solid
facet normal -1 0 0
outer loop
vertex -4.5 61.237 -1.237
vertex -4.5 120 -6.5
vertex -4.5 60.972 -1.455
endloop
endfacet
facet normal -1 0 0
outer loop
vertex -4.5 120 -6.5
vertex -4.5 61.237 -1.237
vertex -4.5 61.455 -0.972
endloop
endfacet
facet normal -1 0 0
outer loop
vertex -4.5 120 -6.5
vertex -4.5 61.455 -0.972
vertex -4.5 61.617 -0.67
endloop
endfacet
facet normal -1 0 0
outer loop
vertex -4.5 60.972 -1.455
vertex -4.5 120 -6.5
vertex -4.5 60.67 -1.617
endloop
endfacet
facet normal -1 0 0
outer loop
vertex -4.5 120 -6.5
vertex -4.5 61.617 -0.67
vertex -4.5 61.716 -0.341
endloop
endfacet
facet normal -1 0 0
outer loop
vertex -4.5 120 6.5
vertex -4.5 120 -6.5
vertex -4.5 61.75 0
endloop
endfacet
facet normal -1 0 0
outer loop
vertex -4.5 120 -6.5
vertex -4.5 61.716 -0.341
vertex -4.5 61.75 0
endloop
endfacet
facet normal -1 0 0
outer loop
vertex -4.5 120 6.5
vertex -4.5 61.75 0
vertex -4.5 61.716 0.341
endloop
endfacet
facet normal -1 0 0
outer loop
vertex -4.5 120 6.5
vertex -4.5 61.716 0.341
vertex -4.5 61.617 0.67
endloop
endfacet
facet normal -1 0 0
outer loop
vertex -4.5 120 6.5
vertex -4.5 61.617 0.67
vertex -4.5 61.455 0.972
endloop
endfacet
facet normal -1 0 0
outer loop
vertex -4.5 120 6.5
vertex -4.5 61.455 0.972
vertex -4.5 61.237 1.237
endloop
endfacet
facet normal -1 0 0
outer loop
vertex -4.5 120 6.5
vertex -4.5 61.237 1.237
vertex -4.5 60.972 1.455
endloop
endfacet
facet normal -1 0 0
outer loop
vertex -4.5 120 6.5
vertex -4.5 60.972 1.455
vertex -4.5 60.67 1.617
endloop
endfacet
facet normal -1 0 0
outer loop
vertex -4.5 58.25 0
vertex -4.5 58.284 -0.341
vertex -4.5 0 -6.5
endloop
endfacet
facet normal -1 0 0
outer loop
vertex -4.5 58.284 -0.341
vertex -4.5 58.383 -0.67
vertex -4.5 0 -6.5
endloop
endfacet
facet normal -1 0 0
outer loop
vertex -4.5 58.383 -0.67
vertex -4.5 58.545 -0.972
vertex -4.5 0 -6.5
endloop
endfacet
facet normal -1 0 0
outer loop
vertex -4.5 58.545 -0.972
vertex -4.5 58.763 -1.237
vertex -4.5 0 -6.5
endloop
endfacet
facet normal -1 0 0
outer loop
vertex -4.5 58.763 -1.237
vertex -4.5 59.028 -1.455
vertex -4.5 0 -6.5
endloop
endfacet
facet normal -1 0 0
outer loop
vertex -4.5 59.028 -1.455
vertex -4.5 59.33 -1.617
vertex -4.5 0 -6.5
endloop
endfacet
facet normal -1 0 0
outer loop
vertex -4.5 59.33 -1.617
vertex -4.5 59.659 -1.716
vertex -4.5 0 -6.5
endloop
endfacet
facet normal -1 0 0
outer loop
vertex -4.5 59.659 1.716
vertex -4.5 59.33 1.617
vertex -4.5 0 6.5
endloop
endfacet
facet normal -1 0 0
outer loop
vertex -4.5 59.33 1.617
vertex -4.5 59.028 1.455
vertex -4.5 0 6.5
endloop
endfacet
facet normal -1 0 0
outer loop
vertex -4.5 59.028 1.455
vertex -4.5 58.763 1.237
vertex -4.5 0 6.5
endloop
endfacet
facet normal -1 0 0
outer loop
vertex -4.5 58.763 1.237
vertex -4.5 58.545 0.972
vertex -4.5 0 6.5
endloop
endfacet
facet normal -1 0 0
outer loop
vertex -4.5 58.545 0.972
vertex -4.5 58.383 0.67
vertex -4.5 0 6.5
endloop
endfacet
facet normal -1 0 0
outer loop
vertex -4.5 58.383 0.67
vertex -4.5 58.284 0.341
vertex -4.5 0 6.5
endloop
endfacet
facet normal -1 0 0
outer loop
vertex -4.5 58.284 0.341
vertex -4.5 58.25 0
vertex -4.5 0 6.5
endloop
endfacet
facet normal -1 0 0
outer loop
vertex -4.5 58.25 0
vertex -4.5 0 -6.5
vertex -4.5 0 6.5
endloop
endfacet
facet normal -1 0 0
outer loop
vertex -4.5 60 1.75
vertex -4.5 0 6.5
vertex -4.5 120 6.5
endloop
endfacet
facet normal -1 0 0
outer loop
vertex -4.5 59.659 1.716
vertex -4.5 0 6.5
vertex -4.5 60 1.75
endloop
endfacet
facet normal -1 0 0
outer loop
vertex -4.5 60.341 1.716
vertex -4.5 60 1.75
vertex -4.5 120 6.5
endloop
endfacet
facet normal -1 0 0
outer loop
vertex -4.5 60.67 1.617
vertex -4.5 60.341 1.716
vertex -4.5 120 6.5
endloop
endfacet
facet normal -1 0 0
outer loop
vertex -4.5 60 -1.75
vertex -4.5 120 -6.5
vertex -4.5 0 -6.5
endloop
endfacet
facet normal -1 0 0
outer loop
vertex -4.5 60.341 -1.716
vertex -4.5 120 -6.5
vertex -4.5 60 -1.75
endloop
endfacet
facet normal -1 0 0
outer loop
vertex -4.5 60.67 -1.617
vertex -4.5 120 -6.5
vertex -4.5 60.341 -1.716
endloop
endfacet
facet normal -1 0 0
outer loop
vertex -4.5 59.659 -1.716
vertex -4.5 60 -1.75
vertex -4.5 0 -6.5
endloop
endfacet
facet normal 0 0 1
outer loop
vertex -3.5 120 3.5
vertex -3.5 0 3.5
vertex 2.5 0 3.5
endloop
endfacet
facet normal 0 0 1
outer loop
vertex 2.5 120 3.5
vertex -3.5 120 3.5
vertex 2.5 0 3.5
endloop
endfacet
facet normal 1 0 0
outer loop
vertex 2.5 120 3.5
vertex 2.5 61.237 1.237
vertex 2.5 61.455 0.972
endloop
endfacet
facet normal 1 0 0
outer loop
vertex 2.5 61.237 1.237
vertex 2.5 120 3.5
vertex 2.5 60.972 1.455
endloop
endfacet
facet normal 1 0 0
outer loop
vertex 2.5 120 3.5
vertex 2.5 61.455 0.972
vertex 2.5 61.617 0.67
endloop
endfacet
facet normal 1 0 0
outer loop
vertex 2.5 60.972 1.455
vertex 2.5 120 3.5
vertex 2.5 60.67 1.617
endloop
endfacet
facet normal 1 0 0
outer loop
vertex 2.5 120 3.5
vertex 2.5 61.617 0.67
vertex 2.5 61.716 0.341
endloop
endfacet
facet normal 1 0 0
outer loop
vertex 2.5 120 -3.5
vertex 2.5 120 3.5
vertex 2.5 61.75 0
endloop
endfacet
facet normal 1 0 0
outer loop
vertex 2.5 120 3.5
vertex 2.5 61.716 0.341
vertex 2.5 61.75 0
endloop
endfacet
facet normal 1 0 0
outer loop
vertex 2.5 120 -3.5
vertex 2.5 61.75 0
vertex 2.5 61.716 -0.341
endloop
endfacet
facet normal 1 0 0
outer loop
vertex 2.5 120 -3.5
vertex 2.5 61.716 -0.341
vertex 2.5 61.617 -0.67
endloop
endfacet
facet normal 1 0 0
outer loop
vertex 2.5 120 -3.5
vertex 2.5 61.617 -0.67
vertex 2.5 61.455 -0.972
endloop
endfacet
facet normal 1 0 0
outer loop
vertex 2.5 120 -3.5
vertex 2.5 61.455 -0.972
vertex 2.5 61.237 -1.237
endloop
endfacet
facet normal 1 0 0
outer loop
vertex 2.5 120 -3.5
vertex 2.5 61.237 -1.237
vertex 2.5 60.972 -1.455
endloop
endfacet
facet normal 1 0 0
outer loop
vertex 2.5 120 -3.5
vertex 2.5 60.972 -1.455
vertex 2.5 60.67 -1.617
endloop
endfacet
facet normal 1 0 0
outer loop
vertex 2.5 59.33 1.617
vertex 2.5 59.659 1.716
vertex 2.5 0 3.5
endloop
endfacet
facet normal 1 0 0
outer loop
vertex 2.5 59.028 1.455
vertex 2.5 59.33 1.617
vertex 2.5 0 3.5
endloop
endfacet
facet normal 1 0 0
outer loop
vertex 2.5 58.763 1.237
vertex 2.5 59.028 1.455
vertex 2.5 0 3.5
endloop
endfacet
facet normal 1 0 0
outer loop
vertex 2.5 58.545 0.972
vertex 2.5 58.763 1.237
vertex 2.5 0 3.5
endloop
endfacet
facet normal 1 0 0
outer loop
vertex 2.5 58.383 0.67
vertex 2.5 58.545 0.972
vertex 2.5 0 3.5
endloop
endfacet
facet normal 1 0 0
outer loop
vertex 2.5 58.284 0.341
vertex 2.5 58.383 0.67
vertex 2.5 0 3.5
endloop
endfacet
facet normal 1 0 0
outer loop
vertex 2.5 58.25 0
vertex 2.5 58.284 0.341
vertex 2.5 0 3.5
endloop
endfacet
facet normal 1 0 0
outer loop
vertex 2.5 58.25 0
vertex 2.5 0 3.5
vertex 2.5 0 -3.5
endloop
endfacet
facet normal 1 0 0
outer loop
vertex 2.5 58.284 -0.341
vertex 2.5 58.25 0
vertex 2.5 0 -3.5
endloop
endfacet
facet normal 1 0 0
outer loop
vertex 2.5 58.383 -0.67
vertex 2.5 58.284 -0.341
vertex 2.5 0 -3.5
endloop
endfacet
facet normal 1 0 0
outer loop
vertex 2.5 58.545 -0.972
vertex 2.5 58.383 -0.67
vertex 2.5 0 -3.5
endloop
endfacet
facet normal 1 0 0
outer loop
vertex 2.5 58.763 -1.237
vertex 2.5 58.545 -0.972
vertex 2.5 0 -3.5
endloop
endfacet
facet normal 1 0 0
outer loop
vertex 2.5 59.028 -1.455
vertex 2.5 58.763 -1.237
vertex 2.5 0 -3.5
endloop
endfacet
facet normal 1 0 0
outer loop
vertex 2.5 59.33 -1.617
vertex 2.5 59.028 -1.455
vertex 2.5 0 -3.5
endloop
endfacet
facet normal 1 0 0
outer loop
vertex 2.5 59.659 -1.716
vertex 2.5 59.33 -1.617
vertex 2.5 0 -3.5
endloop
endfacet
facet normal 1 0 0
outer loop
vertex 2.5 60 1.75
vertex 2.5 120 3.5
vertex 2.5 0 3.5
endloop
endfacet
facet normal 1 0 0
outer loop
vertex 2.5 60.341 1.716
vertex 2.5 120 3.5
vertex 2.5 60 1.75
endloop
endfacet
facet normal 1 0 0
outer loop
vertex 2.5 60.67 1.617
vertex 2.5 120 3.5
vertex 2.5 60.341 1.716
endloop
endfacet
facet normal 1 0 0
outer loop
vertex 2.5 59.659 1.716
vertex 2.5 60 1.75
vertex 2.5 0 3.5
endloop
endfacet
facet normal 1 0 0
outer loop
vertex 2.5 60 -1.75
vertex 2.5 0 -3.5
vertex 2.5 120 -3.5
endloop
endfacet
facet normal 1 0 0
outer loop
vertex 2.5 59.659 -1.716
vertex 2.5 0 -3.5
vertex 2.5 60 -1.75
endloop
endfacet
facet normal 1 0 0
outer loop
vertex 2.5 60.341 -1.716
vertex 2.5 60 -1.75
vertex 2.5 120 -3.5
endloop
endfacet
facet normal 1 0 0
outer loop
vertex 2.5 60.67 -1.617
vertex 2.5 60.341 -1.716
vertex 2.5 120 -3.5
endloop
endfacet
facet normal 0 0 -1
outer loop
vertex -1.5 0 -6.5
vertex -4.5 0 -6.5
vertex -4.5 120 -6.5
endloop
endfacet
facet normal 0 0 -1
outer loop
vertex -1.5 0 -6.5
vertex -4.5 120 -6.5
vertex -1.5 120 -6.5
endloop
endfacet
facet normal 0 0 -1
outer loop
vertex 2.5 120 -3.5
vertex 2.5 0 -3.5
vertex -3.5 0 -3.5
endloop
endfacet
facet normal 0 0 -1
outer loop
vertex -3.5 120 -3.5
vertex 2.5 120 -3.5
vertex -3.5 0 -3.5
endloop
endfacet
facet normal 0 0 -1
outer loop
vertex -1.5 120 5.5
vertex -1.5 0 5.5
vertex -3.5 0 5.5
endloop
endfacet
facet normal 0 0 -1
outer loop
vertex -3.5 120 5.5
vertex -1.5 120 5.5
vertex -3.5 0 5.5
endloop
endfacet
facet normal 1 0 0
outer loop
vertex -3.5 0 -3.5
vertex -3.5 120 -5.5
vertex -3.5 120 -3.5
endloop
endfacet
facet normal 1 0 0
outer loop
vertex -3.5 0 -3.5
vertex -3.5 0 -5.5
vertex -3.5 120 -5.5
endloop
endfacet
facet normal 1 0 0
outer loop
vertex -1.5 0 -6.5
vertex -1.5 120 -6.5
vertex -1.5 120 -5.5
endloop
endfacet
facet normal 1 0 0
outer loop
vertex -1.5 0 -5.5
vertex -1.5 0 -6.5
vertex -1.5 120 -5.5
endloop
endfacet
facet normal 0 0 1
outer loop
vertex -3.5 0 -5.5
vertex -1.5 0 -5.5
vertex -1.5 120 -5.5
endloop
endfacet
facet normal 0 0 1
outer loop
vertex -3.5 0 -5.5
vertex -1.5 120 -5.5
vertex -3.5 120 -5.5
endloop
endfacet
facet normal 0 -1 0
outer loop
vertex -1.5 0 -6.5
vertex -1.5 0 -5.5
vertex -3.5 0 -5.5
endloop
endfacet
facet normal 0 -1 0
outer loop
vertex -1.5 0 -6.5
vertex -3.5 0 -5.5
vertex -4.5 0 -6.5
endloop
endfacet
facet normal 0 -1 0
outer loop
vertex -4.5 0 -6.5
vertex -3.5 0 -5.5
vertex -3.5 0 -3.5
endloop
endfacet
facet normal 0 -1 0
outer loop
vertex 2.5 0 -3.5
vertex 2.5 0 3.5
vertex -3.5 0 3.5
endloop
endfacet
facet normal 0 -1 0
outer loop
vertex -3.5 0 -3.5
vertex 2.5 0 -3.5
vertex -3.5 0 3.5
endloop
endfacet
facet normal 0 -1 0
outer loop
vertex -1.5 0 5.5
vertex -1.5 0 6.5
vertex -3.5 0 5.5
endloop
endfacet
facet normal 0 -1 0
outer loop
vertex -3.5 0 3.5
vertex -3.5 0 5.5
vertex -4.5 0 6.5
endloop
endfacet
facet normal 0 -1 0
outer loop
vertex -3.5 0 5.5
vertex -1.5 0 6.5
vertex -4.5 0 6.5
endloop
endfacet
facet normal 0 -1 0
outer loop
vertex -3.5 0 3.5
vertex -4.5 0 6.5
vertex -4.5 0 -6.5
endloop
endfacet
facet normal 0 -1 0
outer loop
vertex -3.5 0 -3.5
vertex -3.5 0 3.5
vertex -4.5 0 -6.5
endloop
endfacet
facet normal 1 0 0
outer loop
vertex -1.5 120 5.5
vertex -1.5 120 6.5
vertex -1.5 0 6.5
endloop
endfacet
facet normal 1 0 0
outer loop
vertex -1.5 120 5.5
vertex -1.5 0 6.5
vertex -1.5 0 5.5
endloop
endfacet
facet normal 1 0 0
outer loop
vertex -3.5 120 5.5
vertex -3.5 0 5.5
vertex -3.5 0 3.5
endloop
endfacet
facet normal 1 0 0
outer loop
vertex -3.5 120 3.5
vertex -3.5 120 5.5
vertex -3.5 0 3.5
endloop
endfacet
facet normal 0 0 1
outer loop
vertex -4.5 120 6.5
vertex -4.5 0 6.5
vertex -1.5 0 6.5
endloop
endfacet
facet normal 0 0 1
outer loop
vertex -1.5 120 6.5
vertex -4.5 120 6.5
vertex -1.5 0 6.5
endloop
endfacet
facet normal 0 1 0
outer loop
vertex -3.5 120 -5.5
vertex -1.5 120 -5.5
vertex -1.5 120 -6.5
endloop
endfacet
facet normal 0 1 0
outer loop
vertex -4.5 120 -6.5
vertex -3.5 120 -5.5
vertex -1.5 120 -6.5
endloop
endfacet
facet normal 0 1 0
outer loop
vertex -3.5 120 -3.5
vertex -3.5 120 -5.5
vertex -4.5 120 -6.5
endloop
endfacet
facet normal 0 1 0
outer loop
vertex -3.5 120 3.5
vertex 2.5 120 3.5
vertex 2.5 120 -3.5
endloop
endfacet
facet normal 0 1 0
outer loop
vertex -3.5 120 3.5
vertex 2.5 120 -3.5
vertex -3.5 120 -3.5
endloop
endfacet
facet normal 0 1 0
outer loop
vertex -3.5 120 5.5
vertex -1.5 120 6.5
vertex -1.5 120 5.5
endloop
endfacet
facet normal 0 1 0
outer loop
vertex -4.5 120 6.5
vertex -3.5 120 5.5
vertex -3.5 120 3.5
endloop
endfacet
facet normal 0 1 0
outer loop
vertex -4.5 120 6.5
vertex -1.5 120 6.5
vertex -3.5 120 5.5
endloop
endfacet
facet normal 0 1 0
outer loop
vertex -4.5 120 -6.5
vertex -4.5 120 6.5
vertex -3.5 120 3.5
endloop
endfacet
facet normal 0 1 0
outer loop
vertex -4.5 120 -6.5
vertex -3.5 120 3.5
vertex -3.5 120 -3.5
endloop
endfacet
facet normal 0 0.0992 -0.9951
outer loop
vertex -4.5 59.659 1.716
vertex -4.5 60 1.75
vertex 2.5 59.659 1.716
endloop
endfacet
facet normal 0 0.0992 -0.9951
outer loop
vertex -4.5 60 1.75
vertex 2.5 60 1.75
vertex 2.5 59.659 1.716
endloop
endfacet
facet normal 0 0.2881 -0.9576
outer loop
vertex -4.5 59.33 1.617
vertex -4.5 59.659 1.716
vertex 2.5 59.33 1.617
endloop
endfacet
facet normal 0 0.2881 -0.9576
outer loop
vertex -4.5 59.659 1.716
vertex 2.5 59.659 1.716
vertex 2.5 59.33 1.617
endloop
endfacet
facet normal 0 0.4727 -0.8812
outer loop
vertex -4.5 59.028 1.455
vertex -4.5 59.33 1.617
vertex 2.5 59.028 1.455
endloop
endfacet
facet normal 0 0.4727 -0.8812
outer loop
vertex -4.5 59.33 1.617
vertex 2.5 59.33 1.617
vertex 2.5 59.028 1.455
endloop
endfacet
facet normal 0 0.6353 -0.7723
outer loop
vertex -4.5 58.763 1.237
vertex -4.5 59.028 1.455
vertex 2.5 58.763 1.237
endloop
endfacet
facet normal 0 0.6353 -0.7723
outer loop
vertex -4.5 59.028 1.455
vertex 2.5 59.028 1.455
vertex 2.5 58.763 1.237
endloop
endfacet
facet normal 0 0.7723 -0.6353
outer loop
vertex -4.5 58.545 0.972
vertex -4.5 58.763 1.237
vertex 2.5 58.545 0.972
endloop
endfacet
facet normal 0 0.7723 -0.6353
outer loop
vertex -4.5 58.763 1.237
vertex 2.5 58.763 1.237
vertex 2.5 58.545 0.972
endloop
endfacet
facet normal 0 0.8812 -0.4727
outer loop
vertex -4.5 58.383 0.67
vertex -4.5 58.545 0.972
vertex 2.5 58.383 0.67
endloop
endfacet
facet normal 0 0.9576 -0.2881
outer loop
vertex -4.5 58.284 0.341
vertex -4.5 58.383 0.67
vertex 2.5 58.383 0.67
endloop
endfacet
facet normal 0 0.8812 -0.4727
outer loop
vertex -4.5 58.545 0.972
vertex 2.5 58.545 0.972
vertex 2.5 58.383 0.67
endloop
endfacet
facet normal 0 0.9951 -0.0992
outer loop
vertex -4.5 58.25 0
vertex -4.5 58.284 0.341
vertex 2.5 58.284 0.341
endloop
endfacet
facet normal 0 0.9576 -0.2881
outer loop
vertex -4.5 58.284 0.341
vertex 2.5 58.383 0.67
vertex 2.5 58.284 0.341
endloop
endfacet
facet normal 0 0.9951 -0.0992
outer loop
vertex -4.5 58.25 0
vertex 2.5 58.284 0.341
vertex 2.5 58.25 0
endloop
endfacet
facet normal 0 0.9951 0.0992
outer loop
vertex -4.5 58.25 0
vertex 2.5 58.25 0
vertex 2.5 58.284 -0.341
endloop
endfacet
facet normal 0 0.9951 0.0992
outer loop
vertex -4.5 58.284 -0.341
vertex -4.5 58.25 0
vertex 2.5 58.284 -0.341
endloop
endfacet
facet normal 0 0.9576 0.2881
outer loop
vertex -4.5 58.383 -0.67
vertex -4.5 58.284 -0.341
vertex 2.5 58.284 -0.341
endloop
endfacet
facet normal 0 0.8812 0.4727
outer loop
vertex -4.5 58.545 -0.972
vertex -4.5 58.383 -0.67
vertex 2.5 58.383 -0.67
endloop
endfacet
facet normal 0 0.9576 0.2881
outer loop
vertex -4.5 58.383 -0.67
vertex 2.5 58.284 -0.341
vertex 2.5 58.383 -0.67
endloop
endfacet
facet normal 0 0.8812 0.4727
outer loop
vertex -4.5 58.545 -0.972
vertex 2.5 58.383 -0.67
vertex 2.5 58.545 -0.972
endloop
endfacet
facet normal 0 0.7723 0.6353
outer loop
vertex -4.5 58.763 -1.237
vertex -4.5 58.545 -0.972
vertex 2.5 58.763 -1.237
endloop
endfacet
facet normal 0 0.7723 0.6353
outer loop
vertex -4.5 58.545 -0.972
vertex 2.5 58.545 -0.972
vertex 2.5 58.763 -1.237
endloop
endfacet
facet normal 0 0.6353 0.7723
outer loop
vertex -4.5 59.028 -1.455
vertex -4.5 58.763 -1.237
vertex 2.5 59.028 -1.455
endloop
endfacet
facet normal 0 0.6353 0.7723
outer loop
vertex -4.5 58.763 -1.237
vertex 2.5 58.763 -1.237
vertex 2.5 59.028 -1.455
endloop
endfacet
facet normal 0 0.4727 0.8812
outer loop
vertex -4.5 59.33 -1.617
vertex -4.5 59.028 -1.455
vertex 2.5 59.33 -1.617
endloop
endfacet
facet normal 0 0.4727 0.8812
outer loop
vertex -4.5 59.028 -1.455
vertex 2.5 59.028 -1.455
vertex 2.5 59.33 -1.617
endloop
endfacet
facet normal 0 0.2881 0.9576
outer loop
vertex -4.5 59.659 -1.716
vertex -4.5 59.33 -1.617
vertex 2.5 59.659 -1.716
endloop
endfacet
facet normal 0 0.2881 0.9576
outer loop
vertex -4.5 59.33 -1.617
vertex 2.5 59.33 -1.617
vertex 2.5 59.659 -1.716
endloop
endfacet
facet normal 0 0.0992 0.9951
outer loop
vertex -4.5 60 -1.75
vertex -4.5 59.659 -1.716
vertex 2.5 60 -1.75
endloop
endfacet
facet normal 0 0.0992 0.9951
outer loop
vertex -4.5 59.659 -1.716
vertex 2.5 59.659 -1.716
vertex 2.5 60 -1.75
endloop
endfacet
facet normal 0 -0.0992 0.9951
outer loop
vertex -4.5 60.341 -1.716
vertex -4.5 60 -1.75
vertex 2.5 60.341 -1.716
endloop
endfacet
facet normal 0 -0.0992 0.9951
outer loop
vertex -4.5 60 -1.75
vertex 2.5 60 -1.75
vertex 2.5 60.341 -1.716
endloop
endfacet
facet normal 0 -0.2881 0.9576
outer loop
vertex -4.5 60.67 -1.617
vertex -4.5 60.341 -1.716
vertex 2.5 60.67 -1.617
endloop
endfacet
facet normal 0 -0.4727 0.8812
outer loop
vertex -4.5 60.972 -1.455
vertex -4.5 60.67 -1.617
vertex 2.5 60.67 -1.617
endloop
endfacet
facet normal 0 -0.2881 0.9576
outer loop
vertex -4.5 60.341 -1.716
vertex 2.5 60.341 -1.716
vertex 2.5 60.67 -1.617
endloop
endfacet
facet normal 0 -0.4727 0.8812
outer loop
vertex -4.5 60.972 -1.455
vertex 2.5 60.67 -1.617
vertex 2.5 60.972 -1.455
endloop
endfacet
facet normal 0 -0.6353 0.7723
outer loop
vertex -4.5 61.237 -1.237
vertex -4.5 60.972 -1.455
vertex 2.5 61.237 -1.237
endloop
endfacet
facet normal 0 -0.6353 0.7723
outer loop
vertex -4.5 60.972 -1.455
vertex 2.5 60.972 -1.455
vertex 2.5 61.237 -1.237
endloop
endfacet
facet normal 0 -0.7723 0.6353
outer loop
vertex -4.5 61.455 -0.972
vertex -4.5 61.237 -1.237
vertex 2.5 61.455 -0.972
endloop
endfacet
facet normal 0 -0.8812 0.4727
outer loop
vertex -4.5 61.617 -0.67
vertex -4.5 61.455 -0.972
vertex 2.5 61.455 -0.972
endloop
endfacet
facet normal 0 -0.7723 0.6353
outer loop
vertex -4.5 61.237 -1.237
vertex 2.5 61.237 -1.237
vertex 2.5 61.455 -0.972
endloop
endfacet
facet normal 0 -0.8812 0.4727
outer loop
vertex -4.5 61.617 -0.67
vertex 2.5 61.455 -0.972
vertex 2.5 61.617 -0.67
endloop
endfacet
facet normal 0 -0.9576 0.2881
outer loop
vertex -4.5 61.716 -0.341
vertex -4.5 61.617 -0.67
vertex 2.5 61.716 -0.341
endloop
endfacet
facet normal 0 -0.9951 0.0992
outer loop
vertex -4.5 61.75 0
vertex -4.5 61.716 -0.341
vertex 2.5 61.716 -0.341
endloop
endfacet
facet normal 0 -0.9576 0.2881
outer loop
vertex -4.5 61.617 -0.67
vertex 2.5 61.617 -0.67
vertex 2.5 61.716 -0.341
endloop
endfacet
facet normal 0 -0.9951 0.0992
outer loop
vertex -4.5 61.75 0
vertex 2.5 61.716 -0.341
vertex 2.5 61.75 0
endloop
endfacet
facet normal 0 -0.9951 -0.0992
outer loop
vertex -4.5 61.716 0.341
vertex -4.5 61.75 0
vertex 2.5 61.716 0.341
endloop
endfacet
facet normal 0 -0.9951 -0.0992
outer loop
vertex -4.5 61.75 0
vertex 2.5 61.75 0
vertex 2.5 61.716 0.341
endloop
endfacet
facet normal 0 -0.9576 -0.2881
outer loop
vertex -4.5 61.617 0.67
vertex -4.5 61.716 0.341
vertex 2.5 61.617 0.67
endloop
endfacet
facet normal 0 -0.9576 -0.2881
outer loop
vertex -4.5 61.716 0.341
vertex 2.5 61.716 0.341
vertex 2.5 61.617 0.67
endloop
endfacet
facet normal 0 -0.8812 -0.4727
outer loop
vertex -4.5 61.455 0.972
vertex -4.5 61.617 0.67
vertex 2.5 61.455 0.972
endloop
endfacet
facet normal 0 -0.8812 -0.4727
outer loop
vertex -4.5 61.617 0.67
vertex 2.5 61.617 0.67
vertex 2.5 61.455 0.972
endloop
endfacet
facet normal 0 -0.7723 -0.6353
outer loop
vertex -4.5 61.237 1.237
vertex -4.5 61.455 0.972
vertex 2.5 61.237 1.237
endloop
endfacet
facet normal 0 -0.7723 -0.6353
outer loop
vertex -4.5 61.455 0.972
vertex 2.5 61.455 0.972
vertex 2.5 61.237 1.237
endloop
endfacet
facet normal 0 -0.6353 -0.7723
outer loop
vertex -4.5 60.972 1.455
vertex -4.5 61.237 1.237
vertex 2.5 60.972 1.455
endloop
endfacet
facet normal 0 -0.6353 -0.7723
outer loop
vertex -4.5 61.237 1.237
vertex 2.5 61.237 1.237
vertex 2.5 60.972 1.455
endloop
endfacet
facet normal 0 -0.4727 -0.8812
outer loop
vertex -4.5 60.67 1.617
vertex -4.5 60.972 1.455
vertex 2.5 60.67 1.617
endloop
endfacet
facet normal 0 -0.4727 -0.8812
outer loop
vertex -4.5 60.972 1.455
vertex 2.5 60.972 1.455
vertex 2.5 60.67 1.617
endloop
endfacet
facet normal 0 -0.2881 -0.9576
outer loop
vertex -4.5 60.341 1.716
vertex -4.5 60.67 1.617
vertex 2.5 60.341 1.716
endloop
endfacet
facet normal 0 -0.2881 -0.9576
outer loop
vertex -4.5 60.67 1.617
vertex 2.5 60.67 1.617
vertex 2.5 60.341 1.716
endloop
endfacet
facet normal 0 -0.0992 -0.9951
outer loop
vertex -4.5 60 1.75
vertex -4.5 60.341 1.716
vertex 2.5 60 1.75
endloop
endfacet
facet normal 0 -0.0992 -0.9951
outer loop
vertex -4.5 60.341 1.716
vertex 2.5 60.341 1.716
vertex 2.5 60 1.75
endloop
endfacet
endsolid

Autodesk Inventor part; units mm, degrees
ref_plane "YZ Plane" through (0, 0, 0) normal (1, 0, 0) x (0, 1, 0)
ref_plane "XZ Plane" through (0, 0, 0) normal (0, 1, 0) x (-1, 0, 0)
ref_plane "XY Plane" through (0, 0, 0) normal (0, 0, 1) x (1, 0, 0)
sketch "Sketch1" plane through (0, 0, 0) normal (0, 1, 0) x (-1, 0, 0)
  line L0 (3.5, 3.5) -> (-2.5, 3.5)
  line L1 (-2.5, 3.5) -> (-2.5, -3.5)
  line L2 (-2.5, -3.5) -> (3.5, -3.5)
  line L3 (4.5, -3.5) -> (4.5, 3.5)
  line L4 (4.5, 3.5) -> (4.5, 6.5)
  line L5 (4.5, 6.5) -> (1.5, 6.5)
  line L6 (1.5, 6.5) -> (1.5, 5.5)
  line L7 (1.5, 5.5) -> (3.5, 5.5)
  line L8 (3.5, 5.5) -> (3.5, 3.5)
  line L9 (4.5, -3.5) -> (4.5, -6.5)
  line L10 (4.5, -6.5) -> (1.5, -6.5)
  line L11 (1.5, -6.5) -> (1.5, -5.5)
  line L12 (1.5, -5.5) -> (3.5, -5.5)
  line L13 (3.5, -5.5) -> (3.5, -3.5)
  point P0 (0, 0)
  dimension "d2" = 3.5
  dimension "d3" = 4.5
  dimension "d4" = 1
  dimension "d5" = 1
  dimension "d6" = 2
  dimension "d7" = 2
  dimension "d8" = 7
  dimension "d9" = 7
  dimension "d10" = 1
  dimension "d11" = 1
  dimension "d12" = 3
  dimension "d13" = 3
extrude "Extrusion1" add sketch "Sketch1" along normal blind 120
sketch "Sketch2" plane through (-4.5, 0, -6.5) normal (-1, 0, 0) x (0, 0, 1)
  line L0 (0, 0) -> (13, 0) projected
  line L1 (0, 0) -> (0, 120) projected
  point P0 (6.5, 0)
  point P1 (6.5, 60)
  dimension "d16" = 60
  dimension "d17" = 6.5
hole "Hole1" at (-4.5, 60, 0) direction (1, 0, 0) diameter 3.5 end through all
properties part number "Stringer cap"
